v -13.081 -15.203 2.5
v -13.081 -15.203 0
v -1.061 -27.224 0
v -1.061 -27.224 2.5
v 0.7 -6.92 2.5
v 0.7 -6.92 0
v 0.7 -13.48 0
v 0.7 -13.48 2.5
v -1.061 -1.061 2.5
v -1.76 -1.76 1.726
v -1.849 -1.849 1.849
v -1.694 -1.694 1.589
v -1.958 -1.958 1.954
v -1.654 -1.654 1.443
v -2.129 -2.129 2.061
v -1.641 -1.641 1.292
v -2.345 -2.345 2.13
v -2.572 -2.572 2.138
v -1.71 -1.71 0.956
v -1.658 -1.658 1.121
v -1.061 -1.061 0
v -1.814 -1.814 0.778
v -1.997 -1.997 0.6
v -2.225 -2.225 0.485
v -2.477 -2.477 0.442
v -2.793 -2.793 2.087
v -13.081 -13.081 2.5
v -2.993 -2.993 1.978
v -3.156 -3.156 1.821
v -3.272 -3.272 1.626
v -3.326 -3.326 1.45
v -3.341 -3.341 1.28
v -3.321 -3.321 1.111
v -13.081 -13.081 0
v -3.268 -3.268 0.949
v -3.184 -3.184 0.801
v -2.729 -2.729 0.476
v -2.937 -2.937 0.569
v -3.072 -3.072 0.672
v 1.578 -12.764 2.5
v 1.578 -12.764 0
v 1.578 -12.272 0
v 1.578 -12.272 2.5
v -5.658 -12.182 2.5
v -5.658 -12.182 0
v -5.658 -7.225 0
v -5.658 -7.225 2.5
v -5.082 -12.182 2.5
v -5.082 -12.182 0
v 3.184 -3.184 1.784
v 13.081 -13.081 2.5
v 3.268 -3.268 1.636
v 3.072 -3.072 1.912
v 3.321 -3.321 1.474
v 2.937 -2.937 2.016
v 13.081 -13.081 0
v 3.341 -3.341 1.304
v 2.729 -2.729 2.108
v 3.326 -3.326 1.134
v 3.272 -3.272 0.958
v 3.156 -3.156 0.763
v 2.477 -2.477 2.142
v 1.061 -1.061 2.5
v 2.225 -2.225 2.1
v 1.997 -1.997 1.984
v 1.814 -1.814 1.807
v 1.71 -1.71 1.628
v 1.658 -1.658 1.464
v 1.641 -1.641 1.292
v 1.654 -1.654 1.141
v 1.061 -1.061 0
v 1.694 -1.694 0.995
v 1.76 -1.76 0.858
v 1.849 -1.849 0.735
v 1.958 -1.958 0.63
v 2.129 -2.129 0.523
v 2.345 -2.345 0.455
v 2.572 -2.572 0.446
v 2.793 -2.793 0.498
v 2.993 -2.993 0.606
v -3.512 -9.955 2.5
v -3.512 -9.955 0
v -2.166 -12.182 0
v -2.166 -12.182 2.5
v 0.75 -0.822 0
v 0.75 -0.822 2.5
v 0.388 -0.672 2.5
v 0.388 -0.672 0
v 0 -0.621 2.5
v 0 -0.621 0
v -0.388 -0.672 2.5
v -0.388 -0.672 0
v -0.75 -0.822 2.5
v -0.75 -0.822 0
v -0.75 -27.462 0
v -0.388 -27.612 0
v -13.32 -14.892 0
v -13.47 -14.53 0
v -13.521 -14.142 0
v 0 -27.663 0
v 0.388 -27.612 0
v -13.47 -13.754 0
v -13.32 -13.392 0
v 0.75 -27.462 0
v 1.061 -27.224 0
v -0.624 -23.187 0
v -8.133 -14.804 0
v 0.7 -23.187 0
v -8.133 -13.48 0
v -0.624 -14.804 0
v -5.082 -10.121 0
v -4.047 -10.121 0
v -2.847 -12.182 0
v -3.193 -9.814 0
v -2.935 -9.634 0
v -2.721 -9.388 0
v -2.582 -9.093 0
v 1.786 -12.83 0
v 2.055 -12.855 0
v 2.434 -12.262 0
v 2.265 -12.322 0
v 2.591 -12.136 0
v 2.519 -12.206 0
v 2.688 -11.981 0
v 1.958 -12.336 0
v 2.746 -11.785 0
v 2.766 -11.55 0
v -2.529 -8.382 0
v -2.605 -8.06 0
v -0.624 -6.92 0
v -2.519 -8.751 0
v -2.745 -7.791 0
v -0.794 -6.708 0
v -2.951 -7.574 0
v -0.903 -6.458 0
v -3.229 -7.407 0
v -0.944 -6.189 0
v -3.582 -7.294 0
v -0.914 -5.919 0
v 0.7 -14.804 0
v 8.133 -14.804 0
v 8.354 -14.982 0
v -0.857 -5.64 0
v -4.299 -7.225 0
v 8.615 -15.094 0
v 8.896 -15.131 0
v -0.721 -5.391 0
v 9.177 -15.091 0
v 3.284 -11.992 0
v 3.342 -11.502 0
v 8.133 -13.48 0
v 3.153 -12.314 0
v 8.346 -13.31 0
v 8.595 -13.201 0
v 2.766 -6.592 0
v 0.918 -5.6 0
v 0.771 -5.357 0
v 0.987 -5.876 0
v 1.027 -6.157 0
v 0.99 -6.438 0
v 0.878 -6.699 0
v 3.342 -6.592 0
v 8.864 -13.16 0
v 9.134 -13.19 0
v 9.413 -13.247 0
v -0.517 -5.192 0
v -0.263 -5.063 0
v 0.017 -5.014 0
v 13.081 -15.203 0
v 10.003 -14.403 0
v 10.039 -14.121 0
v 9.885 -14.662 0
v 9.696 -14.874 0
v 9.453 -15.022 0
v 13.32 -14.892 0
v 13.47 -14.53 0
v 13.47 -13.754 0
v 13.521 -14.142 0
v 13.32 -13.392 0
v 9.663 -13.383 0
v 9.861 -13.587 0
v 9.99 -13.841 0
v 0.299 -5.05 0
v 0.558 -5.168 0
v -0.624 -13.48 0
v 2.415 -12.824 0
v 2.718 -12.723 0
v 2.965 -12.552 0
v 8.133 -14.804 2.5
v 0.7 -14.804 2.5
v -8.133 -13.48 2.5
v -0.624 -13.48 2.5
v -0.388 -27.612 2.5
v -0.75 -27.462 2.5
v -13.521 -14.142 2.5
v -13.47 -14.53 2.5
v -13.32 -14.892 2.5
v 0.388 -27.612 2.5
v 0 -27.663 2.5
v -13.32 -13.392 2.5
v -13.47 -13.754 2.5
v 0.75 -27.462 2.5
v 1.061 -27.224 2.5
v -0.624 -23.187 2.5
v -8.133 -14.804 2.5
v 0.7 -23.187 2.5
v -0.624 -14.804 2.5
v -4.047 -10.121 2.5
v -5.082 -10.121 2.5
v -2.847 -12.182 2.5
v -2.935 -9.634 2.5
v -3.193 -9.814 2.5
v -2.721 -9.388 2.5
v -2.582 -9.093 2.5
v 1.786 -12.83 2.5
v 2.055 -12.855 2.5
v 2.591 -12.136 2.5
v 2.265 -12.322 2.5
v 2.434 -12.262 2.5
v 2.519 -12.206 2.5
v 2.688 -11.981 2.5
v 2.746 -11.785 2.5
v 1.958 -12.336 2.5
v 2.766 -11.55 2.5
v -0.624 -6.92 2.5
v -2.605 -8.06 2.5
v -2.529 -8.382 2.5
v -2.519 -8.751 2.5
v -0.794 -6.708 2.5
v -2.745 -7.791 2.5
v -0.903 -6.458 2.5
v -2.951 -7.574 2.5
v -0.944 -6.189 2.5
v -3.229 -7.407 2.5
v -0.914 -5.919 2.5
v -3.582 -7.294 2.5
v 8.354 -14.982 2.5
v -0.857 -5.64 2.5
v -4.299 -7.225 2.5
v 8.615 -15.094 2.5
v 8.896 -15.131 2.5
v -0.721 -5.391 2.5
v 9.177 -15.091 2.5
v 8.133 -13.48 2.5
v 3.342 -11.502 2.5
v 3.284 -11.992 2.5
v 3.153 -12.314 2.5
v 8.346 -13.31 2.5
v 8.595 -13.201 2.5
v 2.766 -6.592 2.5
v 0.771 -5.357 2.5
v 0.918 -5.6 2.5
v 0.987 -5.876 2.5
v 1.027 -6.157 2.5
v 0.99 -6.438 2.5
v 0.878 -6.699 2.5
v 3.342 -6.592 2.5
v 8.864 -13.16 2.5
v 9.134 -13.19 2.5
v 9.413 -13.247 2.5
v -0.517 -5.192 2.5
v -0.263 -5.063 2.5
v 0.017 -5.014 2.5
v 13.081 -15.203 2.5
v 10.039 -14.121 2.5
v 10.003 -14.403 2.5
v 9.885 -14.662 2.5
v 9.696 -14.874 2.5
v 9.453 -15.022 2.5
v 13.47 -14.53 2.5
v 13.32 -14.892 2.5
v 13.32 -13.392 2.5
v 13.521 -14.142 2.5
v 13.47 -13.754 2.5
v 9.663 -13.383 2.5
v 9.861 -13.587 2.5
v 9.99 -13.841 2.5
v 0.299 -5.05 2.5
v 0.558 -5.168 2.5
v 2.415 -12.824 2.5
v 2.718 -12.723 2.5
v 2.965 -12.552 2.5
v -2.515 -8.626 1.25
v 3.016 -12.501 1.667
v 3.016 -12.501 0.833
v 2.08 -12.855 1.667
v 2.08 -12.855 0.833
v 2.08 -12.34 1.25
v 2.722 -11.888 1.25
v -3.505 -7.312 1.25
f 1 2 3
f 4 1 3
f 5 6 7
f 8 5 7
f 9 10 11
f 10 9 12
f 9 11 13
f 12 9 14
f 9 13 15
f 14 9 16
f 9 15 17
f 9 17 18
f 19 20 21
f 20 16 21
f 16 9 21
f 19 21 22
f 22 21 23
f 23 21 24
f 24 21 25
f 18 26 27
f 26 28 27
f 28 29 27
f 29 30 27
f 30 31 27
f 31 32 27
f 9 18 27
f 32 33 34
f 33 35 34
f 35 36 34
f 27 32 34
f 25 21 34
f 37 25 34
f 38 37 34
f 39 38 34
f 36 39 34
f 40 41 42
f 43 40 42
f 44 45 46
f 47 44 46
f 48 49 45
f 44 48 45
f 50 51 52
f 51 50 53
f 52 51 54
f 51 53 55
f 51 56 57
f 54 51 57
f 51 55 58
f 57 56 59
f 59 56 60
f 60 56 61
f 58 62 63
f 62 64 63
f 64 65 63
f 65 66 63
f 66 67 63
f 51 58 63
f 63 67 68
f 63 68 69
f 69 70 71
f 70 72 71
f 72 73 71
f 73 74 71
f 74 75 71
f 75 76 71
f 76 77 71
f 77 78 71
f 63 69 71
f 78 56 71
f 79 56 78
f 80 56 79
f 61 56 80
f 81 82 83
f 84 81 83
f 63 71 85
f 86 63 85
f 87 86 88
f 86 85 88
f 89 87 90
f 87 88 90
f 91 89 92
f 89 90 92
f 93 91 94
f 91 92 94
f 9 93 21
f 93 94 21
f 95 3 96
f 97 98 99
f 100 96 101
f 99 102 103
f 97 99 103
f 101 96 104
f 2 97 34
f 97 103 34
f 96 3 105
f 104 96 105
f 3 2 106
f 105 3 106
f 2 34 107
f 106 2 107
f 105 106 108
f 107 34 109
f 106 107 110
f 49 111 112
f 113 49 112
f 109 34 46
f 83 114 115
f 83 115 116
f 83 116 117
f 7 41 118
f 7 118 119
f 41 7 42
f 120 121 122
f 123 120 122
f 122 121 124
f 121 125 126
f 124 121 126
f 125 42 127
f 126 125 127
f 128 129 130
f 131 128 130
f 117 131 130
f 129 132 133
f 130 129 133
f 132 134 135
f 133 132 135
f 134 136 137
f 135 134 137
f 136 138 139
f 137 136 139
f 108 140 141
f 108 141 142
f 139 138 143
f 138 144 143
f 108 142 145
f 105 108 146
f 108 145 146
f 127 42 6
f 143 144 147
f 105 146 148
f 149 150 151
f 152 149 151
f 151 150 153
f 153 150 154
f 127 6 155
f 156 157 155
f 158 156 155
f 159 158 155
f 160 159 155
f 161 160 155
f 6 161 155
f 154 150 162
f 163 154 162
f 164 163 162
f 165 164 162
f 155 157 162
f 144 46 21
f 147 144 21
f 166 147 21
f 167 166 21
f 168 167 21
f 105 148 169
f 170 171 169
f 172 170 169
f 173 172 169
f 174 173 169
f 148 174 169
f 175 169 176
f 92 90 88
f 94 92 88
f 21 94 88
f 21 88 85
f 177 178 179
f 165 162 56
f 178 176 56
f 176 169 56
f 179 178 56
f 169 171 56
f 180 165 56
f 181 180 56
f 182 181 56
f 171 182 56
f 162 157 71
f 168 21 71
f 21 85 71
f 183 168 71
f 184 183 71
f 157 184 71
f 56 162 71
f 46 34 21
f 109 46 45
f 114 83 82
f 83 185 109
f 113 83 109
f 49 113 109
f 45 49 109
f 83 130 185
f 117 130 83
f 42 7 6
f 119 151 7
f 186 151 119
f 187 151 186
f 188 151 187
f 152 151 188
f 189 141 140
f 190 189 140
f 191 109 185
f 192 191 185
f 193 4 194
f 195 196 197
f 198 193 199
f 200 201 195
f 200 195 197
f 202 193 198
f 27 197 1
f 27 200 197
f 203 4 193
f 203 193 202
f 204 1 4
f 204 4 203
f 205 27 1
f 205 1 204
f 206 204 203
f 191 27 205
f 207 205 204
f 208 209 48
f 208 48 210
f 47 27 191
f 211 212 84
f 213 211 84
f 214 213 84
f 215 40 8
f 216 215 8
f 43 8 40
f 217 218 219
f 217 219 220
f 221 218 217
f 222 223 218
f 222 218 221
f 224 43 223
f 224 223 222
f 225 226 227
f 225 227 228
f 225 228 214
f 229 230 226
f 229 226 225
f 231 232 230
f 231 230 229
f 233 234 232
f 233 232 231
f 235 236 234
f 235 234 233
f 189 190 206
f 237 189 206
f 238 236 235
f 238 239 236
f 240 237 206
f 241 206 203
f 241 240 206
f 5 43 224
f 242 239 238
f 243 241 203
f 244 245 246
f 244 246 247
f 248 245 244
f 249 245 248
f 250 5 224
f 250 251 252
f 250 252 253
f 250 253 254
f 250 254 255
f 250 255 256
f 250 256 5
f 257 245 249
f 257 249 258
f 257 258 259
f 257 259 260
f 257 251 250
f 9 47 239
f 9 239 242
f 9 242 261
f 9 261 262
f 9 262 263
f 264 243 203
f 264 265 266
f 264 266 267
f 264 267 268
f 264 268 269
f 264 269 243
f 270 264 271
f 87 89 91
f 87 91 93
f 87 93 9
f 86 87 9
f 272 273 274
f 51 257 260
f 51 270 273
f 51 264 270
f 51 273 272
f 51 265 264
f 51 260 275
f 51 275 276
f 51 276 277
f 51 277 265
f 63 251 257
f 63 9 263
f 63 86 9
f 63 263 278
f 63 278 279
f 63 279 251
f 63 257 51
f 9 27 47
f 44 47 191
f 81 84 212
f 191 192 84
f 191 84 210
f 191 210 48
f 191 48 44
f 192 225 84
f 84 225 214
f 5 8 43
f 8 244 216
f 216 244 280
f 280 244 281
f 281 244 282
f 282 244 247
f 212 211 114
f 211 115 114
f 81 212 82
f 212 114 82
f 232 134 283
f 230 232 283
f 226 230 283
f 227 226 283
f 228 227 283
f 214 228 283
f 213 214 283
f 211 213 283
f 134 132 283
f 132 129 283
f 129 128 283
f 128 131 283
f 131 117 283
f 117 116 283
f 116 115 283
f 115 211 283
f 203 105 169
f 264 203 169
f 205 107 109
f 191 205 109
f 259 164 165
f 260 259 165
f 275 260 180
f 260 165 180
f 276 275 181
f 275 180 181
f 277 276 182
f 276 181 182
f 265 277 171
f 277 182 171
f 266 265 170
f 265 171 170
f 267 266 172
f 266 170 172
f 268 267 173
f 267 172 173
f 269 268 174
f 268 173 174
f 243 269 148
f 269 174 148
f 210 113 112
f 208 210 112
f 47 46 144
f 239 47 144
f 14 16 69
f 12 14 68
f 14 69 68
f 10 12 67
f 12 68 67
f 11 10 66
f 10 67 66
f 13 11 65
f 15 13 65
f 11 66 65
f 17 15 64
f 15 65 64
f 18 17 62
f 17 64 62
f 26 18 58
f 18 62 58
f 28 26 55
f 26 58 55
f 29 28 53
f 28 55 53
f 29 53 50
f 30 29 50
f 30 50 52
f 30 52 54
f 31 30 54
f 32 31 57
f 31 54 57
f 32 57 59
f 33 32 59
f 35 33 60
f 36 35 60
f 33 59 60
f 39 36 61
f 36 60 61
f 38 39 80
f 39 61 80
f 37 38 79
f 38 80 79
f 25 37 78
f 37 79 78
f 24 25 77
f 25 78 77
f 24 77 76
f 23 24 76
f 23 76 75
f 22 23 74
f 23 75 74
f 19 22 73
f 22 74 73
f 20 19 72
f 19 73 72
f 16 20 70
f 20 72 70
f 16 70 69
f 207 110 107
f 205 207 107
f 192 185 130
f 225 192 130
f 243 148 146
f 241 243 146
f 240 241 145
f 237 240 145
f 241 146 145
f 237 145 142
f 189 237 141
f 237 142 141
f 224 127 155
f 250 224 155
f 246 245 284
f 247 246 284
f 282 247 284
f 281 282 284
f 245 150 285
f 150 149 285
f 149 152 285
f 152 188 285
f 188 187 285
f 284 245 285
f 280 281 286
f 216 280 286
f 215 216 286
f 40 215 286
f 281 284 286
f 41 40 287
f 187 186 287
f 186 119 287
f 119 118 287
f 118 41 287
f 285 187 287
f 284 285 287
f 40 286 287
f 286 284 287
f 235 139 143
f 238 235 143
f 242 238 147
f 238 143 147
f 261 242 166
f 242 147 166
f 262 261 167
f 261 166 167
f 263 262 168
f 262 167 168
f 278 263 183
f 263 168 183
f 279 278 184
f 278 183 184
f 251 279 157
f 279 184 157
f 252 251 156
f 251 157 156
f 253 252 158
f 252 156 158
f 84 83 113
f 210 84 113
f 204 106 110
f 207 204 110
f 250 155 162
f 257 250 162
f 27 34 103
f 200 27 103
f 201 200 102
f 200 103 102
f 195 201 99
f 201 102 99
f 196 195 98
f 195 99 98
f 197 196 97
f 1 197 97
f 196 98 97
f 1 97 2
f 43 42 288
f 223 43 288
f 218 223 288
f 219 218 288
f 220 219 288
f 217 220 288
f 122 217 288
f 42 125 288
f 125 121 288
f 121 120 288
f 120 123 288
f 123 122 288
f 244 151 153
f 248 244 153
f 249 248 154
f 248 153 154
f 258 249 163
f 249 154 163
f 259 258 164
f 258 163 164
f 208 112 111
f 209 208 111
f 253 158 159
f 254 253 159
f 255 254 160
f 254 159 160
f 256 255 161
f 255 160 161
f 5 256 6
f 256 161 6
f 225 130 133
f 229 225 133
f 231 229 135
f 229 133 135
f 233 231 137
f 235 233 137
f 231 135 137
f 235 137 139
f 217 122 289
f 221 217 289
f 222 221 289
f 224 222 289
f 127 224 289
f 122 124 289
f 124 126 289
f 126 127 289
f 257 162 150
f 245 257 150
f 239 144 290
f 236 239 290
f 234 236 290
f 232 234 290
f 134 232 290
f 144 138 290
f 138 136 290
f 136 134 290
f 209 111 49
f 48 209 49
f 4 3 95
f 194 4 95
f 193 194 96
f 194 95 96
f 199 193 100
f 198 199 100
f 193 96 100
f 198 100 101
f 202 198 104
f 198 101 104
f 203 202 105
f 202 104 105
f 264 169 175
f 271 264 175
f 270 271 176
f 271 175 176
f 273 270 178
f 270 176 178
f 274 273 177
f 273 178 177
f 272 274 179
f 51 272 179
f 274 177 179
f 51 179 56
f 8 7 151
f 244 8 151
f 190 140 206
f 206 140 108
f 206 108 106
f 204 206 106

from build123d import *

# Parameters (mm, degrees)
F1_DEPTH = 2.5
F2_R     = 0.85
F3_DEPTH = 12.5


with BuildPart() as f1:
    # F0 (on Top) → F1 (new body)
    with BuildSketch(Plane.XY):
        with BuildLine():
            Line((13.081475452, -13.081475452), (1.0606601718, -1.0606601718))
            ThreePointArc((1.0606601718, -1.0606601718), (0, -0.6213203436), (-1.0606601718, -1.0606601718))
            Line((-1.0606601718, -1.0606601718), (-13.081475452, -13.081475452))
            ThreePointArc((-13.081475452, -13.081475452), (-13.5208152802, -14.1421356237), (-13.081475452, -15.2027957955))
            Line((-13.081475452, -15.2027957955), (-1.0606601718, -27.2236110757))
            ThreePointArc((-1.0606601718, -27.2236110757), (0, -27.6629509039), (1.0606601718, -27.2236110757))
            Line((1.0606601718, -27.2236110757), (13.081475452, -15.2027957955))
            ThreePointArc((13.081475452, -15.2027957955), (13.5208152802, -14.1421356237), (13.081475452, -13.081475452))
        make_face()
        with BuildLine():
            Line((-4.0470226145, -10.1208059821), (-5.0821788645, -10.1208059821))
            Line((-5.0821788645, -10.1208059821), (-5.0821788645, -12.1824379265))
            Line((-5.0821788645, -12.1824379265), (-5.6583507395, -12.1824379265))
            Line((-5.6583507395, -12.1824379265), (-5.6583507395, -7.2247556349))
            Line((-5.6583507395, -7.2247556349), (-4.2987587256, -7.2247556349))
            add(Edge.make_bspline(
                [(-4.2987587256, -7.2247556349), (-3.3862153229, -7.2247556349), (-2.9505599409, -7.574147996)],
                knots=[0, 0, 0, 1, 1, 1], degree=2))
            add(Edge.make_bspline(
                [(-2.9505599409, -7.574147996), (-2.514904559, -7.9235403571), (-2.514904559, -8.6255802876)],
                knots=[0, 0, 0, 1, 1, 1], degree=2))
            add(Edge.make_bspline(
                [(-2.514904559, -8.6255802876), (-2.514904559, -9.6086532043), (-3.5120833784, -9.9547903571)],
                knots=[0, 0, 0, 1, 1, 1], degree=2))
            Line((-3.5120833784, -9.9547903571), (-2.1655121979, -12.1824379265))
            Line((-2.1655121979, -12.1824379265), (-2.846935809, -12.1824379265))
            Line((-2.846935809, -12.1824379265), (-4.0470226145, -10.1208059821))
        make_face(mode=Mode.SUBTRACT)
        with BuildLine():
            Line((-8.1334756687, -14.8039748892), (-8.1334756687, -13.4802963582))
            Line((-8.1334756687, -13.4802963582), (-0.6236797201, -13.4802963582))
            Line((-0.6236797201, -13.4802963582), (-0.6236797201, -6.9198086858))
            ThreePointArc((-0.6236797201, -6.9198086858), (-0.9032194318, -6.4583786209), (-0.9135835525, -5.9189782686))
            ThreePointArc((-0.9135835525, -5.9189782686), (0.0168397474, -5.0141534426), (0.9868078824, -5.876451129))
            ThreePointArc((0.9868078824, -5.876451129), (0.9900106564, -6.4384308628), (0.6999988109, -6.9198086858))
            Line((0.6999988109, -6.9198086858), (0.6999988109, -13.4802963582))
            Line((0.6999988109, -13.4802963582), (8.1334756687, -13.4802963582))
            ThreePointArc((8.1334756687, -13.4802963582), (8.5949057336, -13.2007566465), (9.134306086, -13.1903925258))
            ThreePointArc((9.134306086, -13.1903925258), (10.0391309119, -14.1208158258), (9.1768332255, -15.0907839607))
            ThreePointArc((9.1768332255, -15.0907839607), (8.6148534917, -15.0939867347), (8.1334756687, -14.8039748892))
            Line((8.1334756687, -14.8039748892), (0.6999988109, -14.8039748892))
            Line((0.6999988109, -14.8039748892), (0.6999988109, -23.1867600232))
            Line((0.6999988109, -23.1867600232), (-0.6236797201, -23.1867600232))
            Line((-0.6236797201, -23.1867600232), (-0.6236797201, -14.8039748892))
            Line((-0.6236797201, -14.8039748892), (-8.1334756687, -14.8039748892))
        make_face(mode=Mode.SUBTRACT)
        with BuildLine():
            add(Edge.make_bspline(
                [(3.0161563763, -12.5007560808), (2.690635543, -12.8550312544), (2.0797414457, -12.8550312544)],
                knots=[0, 0, 0, 1, 1, 1], degree=2))
            add(Edge.make_bspline(
                [(2.0797414457, -12.8550312544), (1.7618160985, -12.8550312544), (1.5784393624, -12.7638854211)],
                knots=[0, 0, 0, 1, 1, 1], degree=2))
            Line((1.5784393624, -12.7638854211), (1.5784393624, -12.2723489627))
            add(Edge.make_bspline(
                [(1.5784393624, -12.2723489627), (1.8193247791, -12.3396232683), (2.0797414457, -12.3396232683)],
                knots=[0, 0, 0, 1, 1, 1], degree=2))
            add(Edge.make_bspline(
                [(2.0797414457, -12.3396232683), (2.4161129735, -12.3396232683), (2.5908091541, -12.1361727474)],
                knots=[0, 0, 0, 1, 1, 1], degree=2))
            add(Edge.make_bspline(
                [(2.5908091541, -12.1361727474), (2.7655053346, -11.9327222266), (2.7655053346, -11.5496927127)],
                knots=[0, 0, 0, 1, 1, 1], degree=2))
            Line((2.7655053346, -11.5496927127), (2.7655053346, -6.5920104211))
            Line((2.7655053346, -6.5920104211), (3.3416772096, -6.5920104211))
            Line((3.3416772096, -6.5920104211), (3.3416772096, -11.5019496572))
            add(Edge.make_bspline(
                [(3.3416772096, -11.5019496572), (3.3416772096, -12.1464809072), (3.0161563763, -12.5007560808)],
                knots=[0, 0, 0, 1, 1, 1], degree=2))
        make_face(mode=Mode.SUBTRACT)
    extrude(amount=F1_DEPTH)

    # F2 (on Right) → F3 (cut, symmetric)
    with BuildSketch(Plane.YZ):
        with Locations((-2.4908210296, 1.292226194)):
            Circle(F2_R)
    extrude(amount=F3_DEPTH, both=True, mode=Mode.SUBTRACT)


solid = f1.part
